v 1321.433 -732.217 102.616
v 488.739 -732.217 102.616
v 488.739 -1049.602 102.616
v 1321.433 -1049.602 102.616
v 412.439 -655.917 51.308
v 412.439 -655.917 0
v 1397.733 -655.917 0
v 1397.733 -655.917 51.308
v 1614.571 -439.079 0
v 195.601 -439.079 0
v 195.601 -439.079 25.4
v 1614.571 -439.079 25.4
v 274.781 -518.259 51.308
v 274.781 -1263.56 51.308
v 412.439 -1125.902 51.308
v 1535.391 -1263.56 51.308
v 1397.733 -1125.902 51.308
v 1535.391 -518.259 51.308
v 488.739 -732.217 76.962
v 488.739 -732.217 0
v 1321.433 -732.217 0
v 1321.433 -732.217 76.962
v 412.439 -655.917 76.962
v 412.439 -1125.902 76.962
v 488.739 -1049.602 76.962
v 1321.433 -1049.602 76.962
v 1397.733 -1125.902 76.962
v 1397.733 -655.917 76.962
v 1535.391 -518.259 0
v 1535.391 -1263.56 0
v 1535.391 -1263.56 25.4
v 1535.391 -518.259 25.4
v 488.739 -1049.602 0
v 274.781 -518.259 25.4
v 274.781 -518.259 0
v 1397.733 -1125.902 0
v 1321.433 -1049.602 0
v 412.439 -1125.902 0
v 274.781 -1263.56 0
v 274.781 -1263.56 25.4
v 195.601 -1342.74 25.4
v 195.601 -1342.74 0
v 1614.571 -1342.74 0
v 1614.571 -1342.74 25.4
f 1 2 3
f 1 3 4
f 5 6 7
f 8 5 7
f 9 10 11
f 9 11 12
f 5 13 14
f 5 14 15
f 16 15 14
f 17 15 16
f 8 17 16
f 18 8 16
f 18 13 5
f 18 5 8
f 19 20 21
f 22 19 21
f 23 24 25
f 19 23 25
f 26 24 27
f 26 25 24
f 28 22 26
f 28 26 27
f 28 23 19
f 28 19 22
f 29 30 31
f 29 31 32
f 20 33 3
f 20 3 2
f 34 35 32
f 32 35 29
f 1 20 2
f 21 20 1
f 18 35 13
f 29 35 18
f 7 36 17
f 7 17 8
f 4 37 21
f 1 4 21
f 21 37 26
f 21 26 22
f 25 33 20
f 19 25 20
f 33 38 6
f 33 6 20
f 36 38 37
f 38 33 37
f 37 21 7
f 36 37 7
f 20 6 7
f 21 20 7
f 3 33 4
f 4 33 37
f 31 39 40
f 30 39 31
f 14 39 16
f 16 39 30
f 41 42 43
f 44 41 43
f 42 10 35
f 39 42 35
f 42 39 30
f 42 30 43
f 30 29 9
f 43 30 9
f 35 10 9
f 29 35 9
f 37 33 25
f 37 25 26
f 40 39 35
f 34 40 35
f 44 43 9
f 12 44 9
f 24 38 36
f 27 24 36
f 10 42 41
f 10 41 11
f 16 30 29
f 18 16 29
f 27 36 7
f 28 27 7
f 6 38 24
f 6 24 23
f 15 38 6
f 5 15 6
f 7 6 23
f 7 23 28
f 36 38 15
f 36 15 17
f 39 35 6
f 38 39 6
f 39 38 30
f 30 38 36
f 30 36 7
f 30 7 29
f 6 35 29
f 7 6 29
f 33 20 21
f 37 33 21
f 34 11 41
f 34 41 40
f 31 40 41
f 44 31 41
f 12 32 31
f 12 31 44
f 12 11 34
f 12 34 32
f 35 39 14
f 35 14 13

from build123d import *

# Parameters (mm, degrees)
F0_W     = 1418.969865
F0_H     = 903.661365
F0_W_2   = 1260.609941
F0_H_2   = 745.301442
F1_DEPTH = 25.4
F0_W_3   = 985.293784
F0_H_3   = 469.985285
F2_DEPTH = 51.308
F0_W_4   = 832.694292
F0_H_4   = 317.385793
F3_DEPTH = 76.962
F4_DEPTH = 102.616


with BuildPart() as f1:
    # F0 (on Top) → F1 (new body)
    with BuildSketch(Plane.XY):
        with Locations((905.08581, -890.909465)):
            Rectangle(F0_W, F0_H)
        with Locations((905.08581, -890.909465)):
            Rectangle(F0_W_2, F0_H_2, mode=Mode.SUBTRACT)
    extrude(amount=F1_DEPTH)


with BuildPart() as f2:
    # F0 (on Top) → F2 (new body)
    with BuildSketch(Plane.XY):
        with Locations((905.08581, -890.909465)):
            Rectangle(F0_W_2, F0_H_2)
        with Locations((905.085811, -890.909466)):
            Rectangle(F0_W_3, F0_H_3, mode=Mode.SUBTRACT)
    extrude(amount=F2_DEPTH)


with BuildPart() as f3:
    # F0 (on Top) → F3 (new body)
    with BuildSketch(Plane.XY):
        with Locations((905.085811, -890.909466)):
            Rectangle(F0_W_3, F0_H_3)
        with Locations((905.085811, -890.909465)):
            Rectangle(F0_W_4, F0_H_4, mode=Mode.SUBTRACT)
    extrude(amount=F3_DEPTH)


with BuildPart() as f4:
    # F0 (on Top) → F4 (new body)
    with BuildSketch(Plane.XY):
        with Locations((905.085811, -890.909465)):
            Rectangle(F0_W_4, F0_H_4)
    extrude(amount=F4_DEPTH)


solid = Compound([f1.part, f2.part, f3.part, f4.part])
